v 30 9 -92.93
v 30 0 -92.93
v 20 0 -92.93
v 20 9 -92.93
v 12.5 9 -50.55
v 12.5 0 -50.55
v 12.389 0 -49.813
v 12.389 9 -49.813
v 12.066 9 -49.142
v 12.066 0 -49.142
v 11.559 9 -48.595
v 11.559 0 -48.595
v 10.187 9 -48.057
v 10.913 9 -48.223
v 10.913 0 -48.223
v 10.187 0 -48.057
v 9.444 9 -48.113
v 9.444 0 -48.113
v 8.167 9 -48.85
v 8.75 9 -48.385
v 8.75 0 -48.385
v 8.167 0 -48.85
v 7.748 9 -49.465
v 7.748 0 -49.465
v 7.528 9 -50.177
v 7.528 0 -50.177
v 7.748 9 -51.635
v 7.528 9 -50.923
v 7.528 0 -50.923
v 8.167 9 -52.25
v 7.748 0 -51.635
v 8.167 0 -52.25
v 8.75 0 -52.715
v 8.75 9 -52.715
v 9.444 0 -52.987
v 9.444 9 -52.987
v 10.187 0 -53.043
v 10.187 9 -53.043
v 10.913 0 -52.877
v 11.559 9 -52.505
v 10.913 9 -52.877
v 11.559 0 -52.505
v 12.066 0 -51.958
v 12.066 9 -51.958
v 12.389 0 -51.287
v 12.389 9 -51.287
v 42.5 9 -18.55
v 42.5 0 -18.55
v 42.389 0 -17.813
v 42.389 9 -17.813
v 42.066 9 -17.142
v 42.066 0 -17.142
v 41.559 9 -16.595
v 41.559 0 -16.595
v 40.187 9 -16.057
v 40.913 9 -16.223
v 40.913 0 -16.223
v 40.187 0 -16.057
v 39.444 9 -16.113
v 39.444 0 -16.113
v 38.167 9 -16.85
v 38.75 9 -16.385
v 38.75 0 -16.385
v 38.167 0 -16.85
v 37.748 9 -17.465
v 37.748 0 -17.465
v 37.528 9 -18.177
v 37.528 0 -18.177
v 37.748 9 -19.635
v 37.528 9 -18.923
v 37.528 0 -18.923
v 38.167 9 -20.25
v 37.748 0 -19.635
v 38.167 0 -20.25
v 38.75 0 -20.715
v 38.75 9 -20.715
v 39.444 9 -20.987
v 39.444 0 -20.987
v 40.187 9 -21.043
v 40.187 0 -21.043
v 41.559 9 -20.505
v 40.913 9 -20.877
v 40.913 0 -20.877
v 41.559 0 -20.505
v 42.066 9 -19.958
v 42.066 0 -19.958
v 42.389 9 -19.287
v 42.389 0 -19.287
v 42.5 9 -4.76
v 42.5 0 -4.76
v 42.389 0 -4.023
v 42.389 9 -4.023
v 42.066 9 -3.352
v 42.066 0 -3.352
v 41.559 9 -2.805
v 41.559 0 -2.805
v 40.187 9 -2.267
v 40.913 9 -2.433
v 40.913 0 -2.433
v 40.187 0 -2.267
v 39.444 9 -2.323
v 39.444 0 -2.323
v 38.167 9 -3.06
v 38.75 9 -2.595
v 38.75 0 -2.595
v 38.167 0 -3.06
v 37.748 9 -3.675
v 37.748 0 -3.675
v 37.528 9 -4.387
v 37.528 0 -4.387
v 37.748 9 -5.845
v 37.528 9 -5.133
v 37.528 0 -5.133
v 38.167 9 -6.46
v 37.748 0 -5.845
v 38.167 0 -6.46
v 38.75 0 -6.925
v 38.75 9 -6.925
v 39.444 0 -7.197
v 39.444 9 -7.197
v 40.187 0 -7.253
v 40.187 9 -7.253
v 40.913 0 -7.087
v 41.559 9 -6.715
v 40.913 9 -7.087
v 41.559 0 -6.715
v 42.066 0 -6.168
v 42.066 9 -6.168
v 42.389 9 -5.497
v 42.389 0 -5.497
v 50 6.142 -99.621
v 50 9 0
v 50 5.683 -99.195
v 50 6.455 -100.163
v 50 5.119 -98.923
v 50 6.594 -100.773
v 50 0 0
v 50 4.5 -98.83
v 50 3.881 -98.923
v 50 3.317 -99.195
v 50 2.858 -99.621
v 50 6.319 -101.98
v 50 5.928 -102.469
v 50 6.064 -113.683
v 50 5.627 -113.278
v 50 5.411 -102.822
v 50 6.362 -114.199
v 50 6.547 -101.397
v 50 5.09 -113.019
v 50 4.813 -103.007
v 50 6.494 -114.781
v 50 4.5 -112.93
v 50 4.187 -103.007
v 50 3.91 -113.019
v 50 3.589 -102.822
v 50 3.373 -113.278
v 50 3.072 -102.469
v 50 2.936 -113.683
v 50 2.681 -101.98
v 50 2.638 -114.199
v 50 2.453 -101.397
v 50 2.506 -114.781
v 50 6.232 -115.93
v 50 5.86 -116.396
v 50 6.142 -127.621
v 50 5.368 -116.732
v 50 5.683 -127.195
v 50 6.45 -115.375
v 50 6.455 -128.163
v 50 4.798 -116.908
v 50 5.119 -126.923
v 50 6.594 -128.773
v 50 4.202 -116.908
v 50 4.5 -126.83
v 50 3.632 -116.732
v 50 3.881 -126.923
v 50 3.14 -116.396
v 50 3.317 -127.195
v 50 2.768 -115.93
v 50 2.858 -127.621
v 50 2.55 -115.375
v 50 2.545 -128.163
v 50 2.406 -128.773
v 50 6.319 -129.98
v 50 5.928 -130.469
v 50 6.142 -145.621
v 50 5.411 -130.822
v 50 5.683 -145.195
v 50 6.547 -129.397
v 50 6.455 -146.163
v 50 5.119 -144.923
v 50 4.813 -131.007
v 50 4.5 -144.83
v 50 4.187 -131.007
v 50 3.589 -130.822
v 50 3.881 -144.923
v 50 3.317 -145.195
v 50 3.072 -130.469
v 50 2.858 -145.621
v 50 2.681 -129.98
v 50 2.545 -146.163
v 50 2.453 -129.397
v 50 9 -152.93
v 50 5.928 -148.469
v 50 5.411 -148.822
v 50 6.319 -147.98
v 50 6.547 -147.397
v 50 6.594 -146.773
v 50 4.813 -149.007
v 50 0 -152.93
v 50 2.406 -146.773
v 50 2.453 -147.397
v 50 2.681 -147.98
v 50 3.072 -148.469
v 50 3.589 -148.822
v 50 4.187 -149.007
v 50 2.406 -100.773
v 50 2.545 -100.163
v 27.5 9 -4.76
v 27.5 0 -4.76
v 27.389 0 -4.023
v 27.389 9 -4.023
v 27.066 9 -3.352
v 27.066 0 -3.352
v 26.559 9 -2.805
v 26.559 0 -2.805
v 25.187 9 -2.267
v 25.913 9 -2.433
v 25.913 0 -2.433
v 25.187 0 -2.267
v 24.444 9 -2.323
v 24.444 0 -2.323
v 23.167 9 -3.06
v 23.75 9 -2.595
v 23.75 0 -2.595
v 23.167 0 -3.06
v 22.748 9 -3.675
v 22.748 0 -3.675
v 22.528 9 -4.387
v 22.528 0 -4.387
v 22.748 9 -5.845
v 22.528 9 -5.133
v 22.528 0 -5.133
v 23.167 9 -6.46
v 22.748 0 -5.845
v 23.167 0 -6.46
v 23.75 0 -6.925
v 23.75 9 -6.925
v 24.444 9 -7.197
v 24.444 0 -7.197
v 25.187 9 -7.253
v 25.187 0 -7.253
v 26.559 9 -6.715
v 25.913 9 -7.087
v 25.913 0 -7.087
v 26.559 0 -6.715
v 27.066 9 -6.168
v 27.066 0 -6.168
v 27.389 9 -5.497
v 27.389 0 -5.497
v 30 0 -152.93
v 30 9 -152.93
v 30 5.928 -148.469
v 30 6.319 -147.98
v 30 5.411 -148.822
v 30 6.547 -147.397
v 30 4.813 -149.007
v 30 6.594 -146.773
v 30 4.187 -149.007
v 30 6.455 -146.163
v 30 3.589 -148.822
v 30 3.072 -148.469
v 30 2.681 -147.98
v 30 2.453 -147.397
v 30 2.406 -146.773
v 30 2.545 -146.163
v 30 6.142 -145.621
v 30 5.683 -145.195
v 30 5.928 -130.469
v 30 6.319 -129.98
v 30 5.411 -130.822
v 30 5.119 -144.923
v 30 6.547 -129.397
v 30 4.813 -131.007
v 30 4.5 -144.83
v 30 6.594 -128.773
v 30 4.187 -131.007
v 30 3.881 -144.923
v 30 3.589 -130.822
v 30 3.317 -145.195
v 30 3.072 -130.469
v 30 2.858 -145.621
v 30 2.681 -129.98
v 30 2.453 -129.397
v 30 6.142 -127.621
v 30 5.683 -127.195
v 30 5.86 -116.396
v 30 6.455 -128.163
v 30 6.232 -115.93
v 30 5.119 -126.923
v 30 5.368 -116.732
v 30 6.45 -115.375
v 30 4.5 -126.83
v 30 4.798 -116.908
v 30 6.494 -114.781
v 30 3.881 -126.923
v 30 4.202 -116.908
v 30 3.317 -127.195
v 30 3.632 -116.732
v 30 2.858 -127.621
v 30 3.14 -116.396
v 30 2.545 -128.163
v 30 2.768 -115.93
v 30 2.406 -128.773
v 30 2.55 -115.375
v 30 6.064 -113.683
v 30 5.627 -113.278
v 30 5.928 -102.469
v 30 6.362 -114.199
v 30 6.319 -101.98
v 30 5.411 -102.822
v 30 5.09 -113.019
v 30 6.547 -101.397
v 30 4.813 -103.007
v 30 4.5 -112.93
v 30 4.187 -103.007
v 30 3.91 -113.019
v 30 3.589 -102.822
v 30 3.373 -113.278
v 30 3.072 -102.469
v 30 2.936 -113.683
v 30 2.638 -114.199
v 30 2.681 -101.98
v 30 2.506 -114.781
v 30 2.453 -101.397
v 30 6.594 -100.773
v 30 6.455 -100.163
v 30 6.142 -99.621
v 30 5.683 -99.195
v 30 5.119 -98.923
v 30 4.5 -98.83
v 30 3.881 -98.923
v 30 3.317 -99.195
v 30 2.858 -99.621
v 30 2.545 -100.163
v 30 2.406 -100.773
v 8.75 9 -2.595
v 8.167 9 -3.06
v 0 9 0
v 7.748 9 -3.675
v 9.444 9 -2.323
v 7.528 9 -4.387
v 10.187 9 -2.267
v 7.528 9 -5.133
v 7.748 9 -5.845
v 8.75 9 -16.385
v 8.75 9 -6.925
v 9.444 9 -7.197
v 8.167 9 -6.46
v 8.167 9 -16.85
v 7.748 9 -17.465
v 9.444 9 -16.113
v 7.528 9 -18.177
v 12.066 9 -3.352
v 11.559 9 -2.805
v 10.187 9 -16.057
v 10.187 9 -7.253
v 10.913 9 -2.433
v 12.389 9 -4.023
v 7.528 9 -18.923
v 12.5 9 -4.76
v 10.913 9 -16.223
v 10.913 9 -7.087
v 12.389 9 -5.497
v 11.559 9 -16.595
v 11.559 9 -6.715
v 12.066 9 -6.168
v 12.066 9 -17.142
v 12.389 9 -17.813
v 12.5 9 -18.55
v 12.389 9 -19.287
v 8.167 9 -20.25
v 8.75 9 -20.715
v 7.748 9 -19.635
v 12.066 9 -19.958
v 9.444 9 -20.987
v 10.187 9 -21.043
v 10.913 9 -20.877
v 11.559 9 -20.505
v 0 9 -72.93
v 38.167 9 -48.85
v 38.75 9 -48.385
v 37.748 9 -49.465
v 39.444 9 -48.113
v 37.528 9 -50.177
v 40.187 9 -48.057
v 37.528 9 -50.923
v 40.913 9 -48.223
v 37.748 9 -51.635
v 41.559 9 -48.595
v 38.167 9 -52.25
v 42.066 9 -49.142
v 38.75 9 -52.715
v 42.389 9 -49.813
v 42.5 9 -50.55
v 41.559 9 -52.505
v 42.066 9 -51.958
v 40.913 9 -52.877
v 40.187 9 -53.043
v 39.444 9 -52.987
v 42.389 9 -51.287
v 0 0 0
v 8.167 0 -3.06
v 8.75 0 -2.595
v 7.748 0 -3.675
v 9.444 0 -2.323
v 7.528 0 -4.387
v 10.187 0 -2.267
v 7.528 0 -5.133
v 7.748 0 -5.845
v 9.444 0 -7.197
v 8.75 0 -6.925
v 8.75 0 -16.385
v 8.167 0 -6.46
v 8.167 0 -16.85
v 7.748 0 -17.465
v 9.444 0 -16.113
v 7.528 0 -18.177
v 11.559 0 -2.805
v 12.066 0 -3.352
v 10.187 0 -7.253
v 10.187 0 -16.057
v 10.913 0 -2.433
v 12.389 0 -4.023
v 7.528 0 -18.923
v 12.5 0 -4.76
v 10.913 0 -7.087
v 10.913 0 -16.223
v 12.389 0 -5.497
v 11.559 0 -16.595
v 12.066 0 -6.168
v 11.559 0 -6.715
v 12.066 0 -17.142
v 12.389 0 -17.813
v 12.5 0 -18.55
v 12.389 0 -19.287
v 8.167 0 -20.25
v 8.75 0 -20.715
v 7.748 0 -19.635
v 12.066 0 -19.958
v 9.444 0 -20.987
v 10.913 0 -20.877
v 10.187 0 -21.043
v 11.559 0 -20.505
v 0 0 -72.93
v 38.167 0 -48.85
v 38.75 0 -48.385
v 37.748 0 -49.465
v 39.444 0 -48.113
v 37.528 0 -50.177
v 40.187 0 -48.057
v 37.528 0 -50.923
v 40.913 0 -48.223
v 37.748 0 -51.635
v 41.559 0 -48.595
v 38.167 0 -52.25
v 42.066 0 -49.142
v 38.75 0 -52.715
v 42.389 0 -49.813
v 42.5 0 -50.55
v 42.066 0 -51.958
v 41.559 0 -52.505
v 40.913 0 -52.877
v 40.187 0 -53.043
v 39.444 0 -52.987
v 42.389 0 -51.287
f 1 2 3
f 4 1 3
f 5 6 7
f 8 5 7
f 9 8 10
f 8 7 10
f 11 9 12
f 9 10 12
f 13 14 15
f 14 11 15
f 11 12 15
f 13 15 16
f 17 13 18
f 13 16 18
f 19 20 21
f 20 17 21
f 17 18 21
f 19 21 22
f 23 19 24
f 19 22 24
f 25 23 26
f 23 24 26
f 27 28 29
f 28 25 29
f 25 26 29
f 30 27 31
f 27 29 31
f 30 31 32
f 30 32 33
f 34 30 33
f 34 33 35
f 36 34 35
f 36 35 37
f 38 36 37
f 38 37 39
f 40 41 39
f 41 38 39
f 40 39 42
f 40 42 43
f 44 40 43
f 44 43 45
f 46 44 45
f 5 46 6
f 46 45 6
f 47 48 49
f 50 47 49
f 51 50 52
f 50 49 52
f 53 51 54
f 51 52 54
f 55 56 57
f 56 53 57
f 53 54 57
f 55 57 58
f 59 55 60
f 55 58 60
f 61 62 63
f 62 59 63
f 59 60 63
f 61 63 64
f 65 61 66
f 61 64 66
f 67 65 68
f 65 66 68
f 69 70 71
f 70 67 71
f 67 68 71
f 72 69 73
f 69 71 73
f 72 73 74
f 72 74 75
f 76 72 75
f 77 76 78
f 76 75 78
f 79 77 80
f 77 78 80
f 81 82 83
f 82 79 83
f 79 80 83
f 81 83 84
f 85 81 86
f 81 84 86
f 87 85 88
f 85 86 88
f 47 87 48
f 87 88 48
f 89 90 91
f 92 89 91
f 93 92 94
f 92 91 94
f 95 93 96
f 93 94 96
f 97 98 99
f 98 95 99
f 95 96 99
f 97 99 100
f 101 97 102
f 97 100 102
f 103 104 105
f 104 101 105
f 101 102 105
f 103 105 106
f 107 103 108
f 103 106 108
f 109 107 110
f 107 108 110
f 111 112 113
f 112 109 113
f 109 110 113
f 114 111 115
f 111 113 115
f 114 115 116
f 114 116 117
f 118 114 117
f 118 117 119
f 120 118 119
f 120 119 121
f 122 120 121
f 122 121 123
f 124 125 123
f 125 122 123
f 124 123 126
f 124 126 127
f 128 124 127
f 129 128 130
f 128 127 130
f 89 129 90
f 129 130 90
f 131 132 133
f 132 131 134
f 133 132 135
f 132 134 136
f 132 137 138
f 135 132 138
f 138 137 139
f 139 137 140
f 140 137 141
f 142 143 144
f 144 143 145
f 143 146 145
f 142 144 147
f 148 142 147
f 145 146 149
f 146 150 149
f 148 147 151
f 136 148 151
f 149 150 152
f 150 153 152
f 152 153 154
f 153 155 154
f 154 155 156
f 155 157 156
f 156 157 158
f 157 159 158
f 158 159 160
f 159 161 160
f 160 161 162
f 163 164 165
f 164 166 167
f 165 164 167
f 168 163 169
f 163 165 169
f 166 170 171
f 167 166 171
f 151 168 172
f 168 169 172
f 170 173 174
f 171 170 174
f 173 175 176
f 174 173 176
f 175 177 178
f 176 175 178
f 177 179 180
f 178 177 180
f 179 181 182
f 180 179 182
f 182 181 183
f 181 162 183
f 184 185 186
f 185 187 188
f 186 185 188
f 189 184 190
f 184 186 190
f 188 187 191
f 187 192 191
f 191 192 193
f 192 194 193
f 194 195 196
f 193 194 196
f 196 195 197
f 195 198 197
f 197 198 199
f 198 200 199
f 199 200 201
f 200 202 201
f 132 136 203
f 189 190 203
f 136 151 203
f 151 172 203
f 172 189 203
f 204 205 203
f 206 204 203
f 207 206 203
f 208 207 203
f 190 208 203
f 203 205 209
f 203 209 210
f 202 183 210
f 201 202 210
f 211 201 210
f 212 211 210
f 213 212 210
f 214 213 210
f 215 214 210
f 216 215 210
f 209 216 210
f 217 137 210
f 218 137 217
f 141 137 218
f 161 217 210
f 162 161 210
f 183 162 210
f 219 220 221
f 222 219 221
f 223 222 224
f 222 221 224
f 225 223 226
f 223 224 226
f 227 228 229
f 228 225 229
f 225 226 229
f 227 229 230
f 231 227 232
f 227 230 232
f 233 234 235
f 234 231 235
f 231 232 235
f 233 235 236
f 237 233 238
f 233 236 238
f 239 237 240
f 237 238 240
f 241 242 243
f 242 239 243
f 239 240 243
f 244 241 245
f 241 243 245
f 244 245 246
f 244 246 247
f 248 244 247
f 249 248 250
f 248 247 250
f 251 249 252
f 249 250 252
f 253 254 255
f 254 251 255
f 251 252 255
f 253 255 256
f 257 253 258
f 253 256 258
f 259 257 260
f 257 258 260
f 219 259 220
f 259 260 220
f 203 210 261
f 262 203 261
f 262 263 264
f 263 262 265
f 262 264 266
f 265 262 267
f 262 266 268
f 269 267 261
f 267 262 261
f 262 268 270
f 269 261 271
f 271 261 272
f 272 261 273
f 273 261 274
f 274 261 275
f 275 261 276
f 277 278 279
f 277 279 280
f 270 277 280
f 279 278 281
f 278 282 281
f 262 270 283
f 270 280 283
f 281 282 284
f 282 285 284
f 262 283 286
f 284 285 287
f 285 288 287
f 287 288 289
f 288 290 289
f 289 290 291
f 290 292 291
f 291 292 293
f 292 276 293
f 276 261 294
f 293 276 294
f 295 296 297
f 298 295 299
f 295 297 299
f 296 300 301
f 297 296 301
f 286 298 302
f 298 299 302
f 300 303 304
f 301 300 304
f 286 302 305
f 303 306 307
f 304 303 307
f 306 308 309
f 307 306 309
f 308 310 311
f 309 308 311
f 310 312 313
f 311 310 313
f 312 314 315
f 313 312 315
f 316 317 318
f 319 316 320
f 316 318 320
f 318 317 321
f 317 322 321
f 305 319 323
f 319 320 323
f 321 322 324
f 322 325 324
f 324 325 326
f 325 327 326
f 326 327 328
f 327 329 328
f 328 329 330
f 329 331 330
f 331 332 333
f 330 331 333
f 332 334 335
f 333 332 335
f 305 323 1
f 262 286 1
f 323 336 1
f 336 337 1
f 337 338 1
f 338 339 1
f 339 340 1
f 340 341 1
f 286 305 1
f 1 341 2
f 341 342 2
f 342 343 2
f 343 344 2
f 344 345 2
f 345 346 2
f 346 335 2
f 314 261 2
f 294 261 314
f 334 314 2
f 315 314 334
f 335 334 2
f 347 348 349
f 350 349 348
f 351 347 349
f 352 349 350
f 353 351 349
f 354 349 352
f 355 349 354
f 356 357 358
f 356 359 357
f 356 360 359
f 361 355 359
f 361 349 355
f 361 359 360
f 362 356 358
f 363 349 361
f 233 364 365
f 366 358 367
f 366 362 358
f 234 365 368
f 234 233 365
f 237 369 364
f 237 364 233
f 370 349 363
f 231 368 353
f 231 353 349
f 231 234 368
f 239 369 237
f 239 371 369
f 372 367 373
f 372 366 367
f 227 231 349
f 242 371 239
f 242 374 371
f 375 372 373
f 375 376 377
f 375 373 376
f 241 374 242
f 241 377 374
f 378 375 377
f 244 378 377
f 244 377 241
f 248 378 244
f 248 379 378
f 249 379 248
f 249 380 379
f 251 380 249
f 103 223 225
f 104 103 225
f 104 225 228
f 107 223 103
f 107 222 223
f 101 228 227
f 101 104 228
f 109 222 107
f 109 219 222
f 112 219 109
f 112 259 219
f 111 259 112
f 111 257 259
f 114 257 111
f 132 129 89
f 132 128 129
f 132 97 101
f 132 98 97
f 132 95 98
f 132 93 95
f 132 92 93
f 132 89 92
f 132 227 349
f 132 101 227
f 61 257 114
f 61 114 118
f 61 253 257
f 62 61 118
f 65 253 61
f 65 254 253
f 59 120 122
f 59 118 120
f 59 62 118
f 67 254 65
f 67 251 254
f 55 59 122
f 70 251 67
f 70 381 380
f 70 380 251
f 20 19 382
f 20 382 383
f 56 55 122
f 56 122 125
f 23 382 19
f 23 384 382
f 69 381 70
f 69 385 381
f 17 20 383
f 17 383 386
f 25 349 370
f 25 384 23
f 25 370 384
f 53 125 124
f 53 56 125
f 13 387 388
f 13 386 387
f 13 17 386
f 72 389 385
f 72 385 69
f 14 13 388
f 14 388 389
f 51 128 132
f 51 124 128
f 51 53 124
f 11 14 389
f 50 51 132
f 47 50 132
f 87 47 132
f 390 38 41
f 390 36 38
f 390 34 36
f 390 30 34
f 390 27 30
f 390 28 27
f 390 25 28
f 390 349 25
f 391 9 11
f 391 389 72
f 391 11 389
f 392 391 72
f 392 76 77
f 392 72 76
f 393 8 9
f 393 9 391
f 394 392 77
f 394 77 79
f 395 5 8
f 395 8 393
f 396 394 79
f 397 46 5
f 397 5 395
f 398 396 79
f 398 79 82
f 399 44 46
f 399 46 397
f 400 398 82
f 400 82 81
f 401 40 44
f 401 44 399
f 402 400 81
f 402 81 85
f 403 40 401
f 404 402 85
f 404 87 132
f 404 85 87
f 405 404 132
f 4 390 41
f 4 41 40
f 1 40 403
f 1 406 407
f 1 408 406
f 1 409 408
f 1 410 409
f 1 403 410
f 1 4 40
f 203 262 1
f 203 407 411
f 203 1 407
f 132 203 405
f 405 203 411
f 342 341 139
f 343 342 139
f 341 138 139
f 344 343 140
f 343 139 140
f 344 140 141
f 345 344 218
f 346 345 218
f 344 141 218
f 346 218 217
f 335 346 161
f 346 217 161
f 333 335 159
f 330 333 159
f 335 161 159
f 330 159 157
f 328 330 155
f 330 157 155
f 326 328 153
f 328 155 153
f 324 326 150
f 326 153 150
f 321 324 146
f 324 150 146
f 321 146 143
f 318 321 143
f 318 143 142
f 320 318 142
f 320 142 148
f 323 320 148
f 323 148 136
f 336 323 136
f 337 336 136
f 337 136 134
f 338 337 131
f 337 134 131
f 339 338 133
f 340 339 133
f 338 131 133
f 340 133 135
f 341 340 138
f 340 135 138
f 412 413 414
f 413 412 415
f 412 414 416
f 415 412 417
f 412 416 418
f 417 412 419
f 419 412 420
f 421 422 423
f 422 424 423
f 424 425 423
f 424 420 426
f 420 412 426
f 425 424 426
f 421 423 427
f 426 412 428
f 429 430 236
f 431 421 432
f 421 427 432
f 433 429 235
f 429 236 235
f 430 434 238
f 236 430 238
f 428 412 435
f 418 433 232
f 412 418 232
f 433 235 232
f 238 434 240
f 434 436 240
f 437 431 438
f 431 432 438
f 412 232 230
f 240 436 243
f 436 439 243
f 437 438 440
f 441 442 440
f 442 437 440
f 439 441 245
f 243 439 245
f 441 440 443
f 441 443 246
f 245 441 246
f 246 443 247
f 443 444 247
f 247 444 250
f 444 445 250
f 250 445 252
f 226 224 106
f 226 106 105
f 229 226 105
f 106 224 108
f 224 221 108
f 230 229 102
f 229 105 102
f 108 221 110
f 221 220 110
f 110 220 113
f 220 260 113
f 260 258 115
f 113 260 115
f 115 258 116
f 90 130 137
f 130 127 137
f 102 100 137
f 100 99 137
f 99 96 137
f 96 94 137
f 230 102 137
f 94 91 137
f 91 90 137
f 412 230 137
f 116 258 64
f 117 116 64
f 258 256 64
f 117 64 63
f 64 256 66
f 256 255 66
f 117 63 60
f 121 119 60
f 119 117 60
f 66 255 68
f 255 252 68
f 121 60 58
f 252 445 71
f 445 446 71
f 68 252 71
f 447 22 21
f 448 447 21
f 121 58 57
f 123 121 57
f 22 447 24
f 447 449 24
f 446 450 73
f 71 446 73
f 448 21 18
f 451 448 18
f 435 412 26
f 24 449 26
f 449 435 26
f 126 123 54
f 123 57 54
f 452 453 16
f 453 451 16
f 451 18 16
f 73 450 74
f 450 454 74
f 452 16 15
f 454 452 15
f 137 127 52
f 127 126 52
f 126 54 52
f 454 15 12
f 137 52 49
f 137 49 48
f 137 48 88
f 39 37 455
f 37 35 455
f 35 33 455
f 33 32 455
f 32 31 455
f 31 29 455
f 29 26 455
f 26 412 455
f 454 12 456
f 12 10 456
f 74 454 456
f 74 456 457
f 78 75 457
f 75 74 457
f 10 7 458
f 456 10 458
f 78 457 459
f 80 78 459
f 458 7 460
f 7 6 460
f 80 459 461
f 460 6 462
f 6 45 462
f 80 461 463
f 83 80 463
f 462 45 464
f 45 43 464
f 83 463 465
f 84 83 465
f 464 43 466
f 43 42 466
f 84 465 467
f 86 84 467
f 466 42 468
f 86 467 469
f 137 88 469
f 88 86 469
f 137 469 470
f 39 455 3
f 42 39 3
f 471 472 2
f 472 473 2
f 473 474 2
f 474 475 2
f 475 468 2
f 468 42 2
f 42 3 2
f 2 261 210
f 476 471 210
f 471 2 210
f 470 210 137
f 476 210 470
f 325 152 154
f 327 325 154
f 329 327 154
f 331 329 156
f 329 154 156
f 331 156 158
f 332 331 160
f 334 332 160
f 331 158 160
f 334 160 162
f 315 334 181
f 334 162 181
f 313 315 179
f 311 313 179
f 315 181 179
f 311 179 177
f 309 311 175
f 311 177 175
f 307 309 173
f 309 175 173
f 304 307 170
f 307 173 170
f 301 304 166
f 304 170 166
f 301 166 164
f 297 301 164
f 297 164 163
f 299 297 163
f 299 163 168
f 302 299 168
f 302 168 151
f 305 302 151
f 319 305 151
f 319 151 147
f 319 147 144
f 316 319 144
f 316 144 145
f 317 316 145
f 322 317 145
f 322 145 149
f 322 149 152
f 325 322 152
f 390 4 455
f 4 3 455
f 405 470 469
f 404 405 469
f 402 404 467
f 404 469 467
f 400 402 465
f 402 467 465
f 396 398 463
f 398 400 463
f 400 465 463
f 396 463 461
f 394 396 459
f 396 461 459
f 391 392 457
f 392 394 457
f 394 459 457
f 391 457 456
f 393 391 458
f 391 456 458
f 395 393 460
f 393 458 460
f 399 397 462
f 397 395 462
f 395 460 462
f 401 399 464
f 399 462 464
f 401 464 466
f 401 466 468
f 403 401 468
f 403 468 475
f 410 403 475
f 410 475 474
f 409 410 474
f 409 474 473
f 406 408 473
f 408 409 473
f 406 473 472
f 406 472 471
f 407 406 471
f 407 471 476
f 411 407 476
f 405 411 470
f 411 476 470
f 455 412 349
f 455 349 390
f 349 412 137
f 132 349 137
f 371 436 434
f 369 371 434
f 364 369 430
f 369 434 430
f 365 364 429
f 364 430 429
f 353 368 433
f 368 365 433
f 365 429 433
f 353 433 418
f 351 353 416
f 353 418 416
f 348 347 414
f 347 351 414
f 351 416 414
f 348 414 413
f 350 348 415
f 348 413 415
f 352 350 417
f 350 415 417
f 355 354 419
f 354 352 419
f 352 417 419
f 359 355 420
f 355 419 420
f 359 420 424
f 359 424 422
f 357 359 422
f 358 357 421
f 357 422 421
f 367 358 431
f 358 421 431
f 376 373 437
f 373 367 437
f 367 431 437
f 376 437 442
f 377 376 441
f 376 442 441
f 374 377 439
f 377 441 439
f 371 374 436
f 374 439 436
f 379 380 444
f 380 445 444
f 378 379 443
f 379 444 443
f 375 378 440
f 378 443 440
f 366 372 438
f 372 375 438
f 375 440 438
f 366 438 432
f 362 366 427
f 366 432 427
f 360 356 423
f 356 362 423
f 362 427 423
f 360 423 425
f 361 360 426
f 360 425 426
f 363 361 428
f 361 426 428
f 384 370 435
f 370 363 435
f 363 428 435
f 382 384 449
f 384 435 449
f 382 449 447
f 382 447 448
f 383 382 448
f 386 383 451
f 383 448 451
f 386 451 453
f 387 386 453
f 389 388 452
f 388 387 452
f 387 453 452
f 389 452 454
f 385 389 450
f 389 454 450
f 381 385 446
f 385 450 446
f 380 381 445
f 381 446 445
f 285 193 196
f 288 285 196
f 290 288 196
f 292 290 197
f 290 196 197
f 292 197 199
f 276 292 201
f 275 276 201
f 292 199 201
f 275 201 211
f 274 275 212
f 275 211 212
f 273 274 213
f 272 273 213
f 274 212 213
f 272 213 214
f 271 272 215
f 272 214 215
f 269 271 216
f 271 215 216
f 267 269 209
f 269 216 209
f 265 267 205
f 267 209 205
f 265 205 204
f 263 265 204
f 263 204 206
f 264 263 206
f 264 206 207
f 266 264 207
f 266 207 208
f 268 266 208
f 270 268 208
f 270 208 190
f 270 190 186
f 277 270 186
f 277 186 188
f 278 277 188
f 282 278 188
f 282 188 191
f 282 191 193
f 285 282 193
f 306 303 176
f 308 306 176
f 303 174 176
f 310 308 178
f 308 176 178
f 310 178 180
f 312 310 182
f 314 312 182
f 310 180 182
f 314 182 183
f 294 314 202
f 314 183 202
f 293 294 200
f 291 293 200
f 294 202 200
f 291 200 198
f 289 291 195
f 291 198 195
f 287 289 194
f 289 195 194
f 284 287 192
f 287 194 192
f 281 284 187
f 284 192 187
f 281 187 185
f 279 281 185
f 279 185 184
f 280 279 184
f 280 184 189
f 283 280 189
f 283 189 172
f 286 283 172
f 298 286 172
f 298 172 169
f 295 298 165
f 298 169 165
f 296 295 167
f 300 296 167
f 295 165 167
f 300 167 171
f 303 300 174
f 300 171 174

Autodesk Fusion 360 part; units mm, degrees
sketch "Sketch1" plane through (0, 0, 0) normal (0, 1, 0) x (1, 0, 0)
  line L0 (0, 0) -> (50, 0)
  line L1 (50, 0) -> (50, 152.93)
  line L2 (50, 152.93) -> (30, 152.93)
  line L3 (30, 152.93) -> (30, 92.93)
  line L4 (0, 0) -> (0, 72.93)
  line L5 (30, 92.93) -> (20, 92.93)
  line L6 (20, 92.93) -> (0, 72.93)
  circle A0 centre (10, 4.76) radius 2.5
  circle A1 centre (25, 4.76) radius 2.5
  circle A2 centre (40, 4.76) radius 2.5
  line L7 (10, 18.55) -> (40, 18.55) construction
  line L8 (40, 18.55) -> (40, 50.55) construction
  line L9 (40, 50.55) -> (10, 50.55) construction
  line L10 (10, 50.55) -> (10, 18.55) construction
  circle A3 centre (10, 50.55) radius 2.5
  circle A4 centre (40, 50.55) radius 2.5
  circle A5 centre (10, 18.55) radius 2.5
  circle A6 centre (40, 18.55) radius 2.5
  point P0 (10, 50.55)
  dimension "d1" = 50
  dimension "d2" = 152.93
  dimension "d3" = 20
  dimension "d4" = 60
  dimension "d5" = 72.93
  dimension "d6" = 10
  dimension "d16" = 5
  dimension "d17" = 5
  dimension "d18" = 5
  dimension "d19" = 4.76
  dimension "d20" = 10
  dimension "d21" = 4.76
  dimension "d22" = 25
  dimension "d23" = 4.76
  dimension "d24" = 40
  dimension "d33" = 5
  dimension "d34" = 5
  dimension "d35" = 5
  dimension "d36" = 5
  dimension "d37" = 30
  dimension "d38" = 32
  dimension "d39" = 10
  dimension "d40" = 18.55
extrude "Extrude3" add sketch "Sketch1" along normal blind 9
sketch "Sketch4" plane through (30, 0, 0) normal (-1, 0, 0) x (0, 0, 1)
  line L0 (-152.93, 0) -> (-92.93, 0)
  line L1 (-92.93, 0) -> (-92.93, 9)
  line L2 (-92.93, 9) -> (-152.93, 9)
  line L3 (-152.93, 9) -> (-152.93, 0)
  line L4 (-152.93, 4.5) -> (-95, 4.5) construction
  line L5 (-100.93, 9) -> (-100.93, 0) construction
  line L6 (-114.93, 9) -> (-114.93, 0) construction
  line L7 (-128.93, 9) -> (-128.93, 0) construction
  line L8 (-146.93, 9) -> (-146.93, 0) construction
  circle A0 centre (-146.93, 4.5) radius 2.1
  circle A1 centre (-128.93, 4.5) radius 2.1
  circle A2 centre (-114.93, 4.5) radius 2
  circle A3 centre (-100.93, 4.5) radius 2.1
  dimension "d45" = 100.93
  dimension "d46" = 114.93
  dimension "d47" = 128.93
  dimension "d48" = 146.93
  dimension "d49" = 4.2
  dimension "d50" = 4.2
  dimension "d51" = 4
  dimension "d52" = 4.2
hole "Hole2" at (30, 4.5, -146.93) direction (1, 0, 0) diameter 4.2 depth 20 tip angle 118
hole "Hole3" at (30, 4.5, -128.93) direction (1, 0, 0) diameter 4.2 end through all
hole "Hole4" at (30, 4.5, -114.93) direction (1, 0, 0) diameter 4 depth 20 tip angle 118
hole "Hole5" at (30, 4.5, -100.93) direction (1, 0, 0) diameter 4.2 depth 20 tip angle 118
